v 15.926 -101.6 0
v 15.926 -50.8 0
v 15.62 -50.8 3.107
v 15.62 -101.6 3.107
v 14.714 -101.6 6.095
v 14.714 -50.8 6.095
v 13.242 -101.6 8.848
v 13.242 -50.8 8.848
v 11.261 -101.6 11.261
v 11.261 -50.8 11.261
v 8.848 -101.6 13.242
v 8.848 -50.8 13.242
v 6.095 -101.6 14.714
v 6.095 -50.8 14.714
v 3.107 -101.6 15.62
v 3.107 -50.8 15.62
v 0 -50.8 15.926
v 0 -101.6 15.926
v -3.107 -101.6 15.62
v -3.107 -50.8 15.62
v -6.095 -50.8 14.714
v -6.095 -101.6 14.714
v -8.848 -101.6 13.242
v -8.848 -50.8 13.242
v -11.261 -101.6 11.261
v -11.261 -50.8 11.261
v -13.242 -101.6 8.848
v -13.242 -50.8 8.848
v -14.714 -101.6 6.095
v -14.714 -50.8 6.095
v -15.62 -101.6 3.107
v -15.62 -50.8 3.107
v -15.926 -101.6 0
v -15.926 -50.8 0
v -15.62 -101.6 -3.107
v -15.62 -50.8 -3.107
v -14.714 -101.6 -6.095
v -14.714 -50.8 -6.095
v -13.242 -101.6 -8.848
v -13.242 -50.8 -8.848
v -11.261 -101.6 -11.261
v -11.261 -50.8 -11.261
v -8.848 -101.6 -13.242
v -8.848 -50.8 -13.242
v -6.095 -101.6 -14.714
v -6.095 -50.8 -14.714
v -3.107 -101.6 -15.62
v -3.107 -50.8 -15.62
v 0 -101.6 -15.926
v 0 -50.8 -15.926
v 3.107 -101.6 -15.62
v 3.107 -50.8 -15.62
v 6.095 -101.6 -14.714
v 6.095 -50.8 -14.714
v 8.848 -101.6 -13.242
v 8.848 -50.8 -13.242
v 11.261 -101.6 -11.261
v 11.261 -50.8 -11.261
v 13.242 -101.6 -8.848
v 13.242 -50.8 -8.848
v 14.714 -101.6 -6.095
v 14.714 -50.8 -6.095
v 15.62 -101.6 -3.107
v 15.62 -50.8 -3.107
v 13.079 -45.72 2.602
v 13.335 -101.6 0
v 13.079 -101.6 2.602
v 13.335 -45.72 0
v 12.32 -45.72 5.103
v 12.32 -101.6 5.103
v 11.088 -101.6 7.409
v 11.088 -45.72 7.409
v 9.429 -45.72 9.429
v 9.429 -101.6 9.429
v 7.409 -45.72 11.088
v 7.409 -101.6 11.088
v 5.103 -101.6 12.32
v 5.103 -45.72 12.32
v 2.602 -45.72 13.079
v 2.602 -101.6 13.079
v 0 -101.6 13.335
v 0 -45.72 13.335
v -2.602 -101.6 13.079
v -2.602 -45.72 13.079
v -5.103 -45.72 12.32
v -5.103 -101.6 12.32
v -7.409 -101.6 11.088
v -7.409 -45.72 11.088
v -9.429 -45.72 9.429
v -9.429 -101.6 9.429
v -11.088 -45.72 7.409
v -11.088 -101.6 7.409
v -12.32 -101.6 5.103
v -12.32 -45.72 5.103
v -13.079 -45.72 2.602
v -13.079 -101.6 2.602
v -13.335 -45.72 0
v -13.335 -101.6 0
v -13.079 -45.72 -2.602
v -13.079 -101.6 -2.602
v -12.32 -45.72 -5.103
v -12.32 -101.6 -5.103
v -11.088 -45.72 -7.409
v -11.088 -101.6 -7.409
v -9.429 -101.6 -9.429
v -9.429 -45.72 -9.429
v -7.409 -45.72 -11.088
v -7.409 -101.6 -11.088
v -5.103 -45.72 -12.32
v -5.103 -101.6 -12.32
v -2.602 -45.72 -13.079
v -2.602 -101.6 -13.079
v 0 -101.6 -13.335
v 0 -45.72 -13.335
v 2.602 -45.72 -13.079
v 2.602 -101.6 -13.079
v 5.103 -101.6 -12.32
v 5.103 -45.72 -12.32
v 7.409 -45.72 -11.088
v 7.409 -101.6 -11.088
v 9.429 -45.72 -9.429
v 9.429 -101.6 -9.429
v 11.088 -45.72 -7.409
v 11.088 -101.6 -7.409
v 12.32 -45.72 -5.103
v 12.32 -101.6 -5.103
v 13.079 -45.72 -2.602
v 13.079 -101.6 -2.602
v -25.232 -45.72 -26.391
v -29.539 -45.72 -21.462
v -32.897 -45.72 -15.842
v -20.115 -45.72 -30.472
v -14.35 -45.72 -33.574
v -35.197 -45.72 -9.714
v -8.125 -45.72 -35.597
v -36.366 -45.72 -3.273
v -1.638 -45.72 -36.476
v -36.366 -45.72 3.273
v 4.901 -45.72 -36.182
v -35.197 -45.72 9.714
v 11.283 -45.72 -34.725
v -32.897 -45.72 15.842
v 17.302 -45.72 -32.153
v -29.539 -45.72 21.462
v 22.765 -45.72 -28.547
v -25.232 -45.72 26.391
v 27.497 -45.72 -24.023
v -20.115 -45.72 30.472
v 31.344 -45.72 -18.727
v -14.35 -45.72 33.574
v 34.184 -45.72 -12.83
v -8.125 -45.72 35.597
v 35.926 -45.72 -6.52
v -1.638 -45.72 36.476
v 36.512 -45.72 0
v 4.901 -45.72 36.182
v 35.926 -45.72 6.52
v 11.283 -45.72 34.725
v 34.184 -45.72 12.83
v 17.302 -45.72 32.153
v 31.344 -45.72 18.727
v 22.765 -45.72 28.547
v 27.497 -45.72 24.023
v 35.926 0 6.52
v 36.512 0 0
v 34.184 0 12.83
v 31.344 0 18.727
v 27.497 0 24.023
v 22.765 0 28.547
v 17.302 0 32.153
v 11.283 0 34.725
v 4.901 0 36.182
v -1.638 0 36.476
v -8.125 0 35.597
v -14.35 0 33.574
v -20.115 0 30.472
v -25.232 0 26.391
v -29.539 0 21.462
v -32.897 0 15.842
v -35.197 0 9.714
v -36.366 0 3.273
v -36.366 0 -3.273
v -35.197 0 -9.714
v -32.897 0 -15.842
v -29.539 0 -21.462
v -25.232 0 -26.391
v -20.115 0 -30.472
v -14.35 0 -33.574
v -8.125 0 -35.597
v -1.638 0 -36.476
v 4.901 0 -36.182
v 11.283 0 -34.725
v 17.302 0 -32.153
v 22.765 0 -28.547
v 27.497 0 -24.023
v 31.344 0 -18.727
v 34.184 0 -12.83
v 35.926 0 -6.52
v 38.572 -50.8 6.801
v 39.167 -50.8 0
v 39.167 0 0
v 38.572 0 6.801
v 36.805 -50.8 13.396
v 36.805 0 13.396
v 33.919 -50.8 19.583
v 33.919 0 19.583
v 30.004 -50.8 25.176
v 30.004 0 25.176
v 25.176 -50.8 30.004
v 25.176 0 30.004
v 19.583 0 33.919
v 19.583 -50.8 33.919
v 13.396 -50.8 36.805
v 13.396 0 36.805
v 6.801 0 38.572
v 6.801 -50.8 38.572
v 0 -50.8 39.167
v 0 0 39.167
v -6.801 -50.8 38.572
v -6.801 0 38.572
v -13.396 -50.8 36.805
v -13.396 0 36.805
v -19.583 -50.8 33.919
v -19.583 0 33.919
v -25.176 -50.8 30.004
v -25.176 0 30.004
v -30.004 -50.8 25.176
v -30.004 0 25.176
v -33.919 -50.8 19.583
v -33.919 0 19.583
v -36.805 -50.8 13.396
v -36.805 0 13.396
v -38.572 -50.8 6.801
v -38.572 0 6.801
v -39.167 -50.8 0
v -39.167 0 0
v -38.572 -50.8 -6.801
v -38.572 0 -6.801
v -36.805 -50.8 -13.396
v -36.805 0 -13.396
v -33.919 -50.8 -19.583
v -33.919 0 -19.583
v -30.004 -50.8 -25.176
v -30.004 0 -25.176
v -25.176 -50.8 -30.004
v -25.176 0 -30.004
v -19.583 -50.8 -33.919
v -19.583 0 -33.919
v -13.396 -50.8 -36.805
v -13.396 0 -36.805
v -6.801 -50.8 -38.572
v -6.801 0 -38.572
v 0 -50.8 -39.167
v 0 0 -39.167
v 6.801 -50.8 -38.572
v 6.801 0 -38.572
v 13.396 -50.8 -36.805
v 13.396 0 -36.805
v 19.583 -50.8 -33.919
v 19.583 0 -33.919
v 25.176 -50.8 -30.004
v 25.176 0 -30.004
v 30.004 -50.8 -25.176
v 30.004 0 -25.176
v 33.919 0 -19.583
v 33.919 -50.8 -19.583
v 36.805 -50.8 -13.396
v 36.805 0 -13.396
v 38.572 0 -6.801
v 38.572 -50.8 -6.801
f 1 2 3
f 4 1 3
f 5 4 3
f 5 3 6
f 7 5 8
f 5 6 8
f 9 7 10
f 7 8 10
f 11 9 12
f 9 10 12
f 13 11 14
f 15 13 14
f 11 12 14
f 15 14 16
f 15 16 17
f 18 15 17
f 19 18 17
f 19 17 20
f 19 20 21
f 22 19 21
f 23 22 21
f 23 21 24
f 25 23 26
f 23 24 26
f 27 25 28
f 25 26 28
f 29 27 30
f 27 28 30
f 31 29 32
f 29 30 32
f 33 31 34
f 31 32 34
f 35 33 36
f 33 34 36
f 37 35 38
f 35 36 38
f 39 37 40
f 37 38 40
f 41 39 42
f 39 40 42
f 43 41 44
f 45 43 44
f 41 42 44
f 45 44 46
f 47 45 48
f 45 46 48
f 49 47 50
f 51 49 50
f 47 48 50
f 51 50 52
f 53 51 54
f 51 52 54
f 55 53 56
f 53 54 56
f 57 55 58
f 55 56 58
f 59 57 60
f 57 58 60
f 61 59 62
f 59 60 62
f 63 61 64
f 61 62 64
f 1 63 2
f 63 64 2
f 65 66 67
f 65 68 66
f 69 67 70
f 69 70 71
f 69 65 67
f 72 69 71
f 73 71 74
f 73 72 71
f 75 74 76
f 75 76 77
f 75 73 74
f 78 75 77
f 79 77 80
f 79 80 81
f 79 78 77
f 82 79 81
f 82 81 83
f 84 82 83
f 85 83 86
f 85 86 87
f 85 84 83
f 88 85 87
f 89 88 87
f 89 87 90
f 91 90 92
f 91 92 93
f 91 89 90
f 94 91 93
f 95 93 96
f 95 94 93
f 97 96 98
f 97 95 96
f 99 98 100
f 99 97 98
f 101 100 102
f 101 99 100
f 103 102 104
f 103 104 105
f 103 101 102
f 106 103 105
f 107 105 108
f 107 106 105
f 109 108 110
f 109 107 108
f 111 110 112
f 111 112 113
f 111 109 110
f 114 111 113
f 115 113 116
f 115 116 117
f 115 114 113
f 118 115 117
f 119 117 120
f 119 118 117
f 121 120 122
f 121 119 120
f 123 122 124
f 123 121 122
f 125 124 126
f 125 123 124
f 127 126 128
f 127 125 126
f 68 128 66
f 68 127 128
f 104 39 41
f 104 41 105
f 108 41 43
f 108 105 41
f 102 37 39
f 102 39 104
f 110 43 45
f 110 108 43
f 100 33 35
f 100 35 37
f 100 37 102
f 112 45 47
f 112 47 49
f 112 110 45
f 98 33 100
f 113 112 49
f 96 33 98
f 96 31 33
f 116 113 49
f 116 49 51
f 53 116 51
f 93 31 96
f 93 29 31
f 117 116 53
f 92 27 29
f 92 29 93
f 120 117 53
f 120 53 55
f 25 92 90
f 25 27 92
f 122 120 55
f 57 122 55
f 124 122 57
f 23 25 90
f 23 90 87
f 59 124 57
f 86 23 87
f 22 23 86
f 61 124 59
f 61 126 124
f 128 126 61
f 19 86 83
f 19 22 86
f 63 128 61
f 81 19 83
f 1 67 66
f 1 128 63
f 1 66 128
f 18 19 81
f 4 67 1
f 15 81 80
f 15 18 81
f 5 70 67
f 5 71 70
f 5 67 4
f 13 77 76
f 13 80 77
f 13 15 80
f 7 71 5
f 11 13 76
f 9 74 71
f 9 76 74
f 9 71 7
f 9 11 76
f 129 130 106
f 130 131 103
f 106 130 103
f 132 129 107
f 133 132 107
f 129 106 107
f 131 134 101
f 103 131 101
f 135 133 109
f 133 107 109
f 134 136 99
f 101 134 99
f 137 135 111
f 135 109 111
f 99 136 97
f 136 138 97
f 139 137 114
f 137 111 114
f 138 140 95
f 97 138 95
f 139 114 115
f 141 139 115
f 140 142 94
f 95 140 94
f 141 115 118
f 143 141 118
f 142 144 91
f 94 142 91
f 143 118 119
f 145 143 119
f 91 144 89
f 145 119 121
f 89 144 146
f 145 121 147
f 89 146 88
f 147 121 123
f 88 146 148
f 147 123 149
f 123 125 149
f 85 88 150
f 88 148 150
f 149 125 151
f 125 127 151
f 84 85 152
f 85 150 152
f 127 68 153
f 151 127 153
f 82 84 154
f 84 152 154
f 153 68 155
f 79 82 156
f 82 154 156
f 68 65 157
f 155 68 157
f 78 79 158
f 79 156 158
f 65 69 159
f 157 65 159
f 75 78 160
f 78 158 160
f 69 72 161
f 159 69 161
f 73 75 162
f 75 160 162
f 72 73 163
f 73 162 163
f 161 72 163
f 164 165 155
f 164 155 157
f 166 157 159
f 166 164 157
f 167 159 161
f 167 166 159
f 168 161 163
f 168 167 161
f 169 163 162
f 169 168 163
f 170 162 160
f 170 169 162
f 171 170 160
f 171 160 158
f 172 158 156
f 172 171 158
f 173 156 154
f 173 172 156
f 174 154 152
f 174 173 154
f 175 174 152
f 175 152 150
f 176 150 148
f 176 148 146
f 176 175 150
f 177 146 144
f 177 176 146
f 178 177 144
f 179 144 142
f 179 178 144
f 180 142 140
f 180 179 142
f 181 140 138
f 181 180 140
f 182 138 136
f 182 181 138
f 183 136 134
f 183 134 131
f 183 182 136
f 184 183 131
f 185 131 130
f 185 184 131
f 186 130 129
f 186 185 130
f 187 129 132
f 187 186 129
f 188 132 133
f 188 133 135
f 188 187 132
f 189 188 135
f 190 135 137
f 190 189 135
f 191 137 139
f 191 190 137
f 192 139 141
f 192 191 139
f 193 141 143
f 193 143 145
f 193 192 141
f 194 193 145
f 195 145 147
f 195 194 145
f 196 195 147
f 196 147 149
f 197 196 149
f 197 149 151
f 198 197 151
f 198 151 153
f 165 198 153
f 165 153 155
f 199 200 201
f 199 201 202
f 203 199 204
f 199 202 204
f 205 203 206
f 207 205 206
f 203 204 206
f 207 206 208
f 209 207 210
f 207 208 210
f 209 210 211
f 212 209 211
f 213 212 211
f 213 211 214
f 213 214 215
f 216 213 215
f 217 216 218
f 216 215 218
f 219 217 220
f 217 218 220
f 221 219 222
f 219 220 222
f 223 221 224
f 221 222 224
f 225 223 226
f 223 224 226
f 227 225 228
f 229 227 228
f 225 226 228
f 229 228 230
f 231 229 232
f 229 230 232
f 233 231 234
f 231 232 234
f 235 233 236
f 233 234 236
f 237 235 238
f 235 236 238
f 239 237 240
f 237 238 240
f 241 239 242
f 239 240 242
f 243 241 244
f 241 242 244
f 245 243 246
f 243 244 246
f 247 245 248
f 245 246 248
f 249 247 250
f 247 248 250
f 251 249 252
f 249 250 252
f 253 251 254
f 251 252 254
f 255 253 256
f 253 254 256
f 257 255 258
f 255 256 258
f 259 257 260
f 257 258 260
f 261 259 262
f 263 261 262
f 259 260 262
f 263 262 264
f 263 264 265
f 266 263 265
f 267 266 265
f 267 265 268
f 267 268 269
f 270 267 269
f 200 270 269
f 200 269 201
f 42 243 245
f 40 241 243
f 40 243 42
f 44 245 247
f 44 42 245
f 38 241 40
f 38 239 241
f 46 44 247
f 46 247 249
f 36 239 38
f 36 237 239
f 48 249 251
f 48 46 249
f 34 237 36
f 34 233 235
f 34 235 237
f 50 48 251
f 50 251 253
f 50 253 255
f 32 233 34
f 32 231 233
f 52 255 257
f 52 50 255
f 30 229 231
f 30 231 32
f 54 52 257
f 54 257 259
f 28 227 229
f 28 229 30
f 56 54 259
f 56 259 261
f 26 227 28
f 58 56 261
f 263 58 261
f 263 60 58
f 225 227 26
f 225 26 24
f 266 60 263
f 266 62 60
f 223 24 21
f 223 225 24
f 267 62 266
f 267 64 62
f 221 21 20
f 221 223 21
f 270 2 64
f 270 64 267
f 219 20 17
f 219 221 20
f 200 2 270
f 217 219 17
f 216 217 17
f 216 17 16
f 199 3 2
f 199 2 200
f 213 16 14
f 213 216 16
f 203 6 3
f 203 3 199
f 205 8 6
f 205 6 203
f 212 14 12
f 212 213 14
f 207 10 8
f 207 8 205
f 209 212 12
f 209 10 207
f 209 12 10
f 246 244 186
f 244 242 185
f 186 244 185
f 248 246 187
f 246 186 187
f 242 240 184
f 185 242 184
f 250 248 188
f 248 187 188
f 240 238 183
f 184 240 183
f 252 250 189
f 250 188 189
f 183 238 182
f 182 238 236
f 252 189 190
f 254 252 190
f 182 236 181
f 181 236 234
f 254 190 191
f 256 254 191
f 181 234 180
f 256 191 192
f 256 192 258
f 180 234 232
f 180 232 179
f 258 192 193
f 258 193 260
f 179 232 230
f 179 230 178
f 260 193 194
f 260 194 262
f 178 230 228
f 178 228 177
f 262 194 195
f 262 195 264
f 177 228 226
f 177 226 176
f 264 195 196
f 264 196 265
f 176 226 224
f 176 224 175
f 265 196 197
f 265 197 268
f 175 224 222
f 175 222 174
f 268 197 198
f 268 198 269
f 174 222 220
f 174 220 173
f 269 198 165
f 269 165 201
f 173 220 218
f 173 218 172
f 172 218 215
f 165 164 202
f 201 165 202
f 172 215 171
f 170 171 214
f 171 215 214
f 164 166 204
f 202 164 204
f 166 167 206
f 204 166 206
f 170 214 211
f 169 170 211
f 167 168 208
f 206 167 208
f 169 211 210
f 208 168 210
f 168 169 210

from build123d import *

# Parameters (mm, degrees)
F0_R     = 39.1668
F0_R_2   = 36.5125
F1_DEPTH = 45.72
F3_R     = 39.1668
F3_R_2   = 13.335
F4_DEPTH = 5.08
F6_R     = 15.9258
F6_R_2   = 13.335
F7_DEPTH = 50.8


with BuildPart() as f1:
    # F0 (on Front) → F1 (new body)
    with BuildSketch(Plane.XZ):
        Circle(F0_R)
        Circle(F0_R_2, mode=Mode.SUBTRACT)
    extrude(amount=F1_DEPTH)

    # F3 (on offset) → F4 (join)
    with BuildSketch(Plane.XZ.offset(45.72)):
        Circle(F3_R)
        Circle(F3_R_2, mode=Mode.SUBTRACT)
    extrude(amount=F4_DEPTH)

    # F6 (on offset) → F7 (join)
    with BuildSketch(Plane.XZ.offset(50.8)):
        Circle(F6_R)
        Circle(F6_R_2, mode=Mode.SUBTRACT)
    extrude(amount=F7_DEPTH)


solid = f1.part
